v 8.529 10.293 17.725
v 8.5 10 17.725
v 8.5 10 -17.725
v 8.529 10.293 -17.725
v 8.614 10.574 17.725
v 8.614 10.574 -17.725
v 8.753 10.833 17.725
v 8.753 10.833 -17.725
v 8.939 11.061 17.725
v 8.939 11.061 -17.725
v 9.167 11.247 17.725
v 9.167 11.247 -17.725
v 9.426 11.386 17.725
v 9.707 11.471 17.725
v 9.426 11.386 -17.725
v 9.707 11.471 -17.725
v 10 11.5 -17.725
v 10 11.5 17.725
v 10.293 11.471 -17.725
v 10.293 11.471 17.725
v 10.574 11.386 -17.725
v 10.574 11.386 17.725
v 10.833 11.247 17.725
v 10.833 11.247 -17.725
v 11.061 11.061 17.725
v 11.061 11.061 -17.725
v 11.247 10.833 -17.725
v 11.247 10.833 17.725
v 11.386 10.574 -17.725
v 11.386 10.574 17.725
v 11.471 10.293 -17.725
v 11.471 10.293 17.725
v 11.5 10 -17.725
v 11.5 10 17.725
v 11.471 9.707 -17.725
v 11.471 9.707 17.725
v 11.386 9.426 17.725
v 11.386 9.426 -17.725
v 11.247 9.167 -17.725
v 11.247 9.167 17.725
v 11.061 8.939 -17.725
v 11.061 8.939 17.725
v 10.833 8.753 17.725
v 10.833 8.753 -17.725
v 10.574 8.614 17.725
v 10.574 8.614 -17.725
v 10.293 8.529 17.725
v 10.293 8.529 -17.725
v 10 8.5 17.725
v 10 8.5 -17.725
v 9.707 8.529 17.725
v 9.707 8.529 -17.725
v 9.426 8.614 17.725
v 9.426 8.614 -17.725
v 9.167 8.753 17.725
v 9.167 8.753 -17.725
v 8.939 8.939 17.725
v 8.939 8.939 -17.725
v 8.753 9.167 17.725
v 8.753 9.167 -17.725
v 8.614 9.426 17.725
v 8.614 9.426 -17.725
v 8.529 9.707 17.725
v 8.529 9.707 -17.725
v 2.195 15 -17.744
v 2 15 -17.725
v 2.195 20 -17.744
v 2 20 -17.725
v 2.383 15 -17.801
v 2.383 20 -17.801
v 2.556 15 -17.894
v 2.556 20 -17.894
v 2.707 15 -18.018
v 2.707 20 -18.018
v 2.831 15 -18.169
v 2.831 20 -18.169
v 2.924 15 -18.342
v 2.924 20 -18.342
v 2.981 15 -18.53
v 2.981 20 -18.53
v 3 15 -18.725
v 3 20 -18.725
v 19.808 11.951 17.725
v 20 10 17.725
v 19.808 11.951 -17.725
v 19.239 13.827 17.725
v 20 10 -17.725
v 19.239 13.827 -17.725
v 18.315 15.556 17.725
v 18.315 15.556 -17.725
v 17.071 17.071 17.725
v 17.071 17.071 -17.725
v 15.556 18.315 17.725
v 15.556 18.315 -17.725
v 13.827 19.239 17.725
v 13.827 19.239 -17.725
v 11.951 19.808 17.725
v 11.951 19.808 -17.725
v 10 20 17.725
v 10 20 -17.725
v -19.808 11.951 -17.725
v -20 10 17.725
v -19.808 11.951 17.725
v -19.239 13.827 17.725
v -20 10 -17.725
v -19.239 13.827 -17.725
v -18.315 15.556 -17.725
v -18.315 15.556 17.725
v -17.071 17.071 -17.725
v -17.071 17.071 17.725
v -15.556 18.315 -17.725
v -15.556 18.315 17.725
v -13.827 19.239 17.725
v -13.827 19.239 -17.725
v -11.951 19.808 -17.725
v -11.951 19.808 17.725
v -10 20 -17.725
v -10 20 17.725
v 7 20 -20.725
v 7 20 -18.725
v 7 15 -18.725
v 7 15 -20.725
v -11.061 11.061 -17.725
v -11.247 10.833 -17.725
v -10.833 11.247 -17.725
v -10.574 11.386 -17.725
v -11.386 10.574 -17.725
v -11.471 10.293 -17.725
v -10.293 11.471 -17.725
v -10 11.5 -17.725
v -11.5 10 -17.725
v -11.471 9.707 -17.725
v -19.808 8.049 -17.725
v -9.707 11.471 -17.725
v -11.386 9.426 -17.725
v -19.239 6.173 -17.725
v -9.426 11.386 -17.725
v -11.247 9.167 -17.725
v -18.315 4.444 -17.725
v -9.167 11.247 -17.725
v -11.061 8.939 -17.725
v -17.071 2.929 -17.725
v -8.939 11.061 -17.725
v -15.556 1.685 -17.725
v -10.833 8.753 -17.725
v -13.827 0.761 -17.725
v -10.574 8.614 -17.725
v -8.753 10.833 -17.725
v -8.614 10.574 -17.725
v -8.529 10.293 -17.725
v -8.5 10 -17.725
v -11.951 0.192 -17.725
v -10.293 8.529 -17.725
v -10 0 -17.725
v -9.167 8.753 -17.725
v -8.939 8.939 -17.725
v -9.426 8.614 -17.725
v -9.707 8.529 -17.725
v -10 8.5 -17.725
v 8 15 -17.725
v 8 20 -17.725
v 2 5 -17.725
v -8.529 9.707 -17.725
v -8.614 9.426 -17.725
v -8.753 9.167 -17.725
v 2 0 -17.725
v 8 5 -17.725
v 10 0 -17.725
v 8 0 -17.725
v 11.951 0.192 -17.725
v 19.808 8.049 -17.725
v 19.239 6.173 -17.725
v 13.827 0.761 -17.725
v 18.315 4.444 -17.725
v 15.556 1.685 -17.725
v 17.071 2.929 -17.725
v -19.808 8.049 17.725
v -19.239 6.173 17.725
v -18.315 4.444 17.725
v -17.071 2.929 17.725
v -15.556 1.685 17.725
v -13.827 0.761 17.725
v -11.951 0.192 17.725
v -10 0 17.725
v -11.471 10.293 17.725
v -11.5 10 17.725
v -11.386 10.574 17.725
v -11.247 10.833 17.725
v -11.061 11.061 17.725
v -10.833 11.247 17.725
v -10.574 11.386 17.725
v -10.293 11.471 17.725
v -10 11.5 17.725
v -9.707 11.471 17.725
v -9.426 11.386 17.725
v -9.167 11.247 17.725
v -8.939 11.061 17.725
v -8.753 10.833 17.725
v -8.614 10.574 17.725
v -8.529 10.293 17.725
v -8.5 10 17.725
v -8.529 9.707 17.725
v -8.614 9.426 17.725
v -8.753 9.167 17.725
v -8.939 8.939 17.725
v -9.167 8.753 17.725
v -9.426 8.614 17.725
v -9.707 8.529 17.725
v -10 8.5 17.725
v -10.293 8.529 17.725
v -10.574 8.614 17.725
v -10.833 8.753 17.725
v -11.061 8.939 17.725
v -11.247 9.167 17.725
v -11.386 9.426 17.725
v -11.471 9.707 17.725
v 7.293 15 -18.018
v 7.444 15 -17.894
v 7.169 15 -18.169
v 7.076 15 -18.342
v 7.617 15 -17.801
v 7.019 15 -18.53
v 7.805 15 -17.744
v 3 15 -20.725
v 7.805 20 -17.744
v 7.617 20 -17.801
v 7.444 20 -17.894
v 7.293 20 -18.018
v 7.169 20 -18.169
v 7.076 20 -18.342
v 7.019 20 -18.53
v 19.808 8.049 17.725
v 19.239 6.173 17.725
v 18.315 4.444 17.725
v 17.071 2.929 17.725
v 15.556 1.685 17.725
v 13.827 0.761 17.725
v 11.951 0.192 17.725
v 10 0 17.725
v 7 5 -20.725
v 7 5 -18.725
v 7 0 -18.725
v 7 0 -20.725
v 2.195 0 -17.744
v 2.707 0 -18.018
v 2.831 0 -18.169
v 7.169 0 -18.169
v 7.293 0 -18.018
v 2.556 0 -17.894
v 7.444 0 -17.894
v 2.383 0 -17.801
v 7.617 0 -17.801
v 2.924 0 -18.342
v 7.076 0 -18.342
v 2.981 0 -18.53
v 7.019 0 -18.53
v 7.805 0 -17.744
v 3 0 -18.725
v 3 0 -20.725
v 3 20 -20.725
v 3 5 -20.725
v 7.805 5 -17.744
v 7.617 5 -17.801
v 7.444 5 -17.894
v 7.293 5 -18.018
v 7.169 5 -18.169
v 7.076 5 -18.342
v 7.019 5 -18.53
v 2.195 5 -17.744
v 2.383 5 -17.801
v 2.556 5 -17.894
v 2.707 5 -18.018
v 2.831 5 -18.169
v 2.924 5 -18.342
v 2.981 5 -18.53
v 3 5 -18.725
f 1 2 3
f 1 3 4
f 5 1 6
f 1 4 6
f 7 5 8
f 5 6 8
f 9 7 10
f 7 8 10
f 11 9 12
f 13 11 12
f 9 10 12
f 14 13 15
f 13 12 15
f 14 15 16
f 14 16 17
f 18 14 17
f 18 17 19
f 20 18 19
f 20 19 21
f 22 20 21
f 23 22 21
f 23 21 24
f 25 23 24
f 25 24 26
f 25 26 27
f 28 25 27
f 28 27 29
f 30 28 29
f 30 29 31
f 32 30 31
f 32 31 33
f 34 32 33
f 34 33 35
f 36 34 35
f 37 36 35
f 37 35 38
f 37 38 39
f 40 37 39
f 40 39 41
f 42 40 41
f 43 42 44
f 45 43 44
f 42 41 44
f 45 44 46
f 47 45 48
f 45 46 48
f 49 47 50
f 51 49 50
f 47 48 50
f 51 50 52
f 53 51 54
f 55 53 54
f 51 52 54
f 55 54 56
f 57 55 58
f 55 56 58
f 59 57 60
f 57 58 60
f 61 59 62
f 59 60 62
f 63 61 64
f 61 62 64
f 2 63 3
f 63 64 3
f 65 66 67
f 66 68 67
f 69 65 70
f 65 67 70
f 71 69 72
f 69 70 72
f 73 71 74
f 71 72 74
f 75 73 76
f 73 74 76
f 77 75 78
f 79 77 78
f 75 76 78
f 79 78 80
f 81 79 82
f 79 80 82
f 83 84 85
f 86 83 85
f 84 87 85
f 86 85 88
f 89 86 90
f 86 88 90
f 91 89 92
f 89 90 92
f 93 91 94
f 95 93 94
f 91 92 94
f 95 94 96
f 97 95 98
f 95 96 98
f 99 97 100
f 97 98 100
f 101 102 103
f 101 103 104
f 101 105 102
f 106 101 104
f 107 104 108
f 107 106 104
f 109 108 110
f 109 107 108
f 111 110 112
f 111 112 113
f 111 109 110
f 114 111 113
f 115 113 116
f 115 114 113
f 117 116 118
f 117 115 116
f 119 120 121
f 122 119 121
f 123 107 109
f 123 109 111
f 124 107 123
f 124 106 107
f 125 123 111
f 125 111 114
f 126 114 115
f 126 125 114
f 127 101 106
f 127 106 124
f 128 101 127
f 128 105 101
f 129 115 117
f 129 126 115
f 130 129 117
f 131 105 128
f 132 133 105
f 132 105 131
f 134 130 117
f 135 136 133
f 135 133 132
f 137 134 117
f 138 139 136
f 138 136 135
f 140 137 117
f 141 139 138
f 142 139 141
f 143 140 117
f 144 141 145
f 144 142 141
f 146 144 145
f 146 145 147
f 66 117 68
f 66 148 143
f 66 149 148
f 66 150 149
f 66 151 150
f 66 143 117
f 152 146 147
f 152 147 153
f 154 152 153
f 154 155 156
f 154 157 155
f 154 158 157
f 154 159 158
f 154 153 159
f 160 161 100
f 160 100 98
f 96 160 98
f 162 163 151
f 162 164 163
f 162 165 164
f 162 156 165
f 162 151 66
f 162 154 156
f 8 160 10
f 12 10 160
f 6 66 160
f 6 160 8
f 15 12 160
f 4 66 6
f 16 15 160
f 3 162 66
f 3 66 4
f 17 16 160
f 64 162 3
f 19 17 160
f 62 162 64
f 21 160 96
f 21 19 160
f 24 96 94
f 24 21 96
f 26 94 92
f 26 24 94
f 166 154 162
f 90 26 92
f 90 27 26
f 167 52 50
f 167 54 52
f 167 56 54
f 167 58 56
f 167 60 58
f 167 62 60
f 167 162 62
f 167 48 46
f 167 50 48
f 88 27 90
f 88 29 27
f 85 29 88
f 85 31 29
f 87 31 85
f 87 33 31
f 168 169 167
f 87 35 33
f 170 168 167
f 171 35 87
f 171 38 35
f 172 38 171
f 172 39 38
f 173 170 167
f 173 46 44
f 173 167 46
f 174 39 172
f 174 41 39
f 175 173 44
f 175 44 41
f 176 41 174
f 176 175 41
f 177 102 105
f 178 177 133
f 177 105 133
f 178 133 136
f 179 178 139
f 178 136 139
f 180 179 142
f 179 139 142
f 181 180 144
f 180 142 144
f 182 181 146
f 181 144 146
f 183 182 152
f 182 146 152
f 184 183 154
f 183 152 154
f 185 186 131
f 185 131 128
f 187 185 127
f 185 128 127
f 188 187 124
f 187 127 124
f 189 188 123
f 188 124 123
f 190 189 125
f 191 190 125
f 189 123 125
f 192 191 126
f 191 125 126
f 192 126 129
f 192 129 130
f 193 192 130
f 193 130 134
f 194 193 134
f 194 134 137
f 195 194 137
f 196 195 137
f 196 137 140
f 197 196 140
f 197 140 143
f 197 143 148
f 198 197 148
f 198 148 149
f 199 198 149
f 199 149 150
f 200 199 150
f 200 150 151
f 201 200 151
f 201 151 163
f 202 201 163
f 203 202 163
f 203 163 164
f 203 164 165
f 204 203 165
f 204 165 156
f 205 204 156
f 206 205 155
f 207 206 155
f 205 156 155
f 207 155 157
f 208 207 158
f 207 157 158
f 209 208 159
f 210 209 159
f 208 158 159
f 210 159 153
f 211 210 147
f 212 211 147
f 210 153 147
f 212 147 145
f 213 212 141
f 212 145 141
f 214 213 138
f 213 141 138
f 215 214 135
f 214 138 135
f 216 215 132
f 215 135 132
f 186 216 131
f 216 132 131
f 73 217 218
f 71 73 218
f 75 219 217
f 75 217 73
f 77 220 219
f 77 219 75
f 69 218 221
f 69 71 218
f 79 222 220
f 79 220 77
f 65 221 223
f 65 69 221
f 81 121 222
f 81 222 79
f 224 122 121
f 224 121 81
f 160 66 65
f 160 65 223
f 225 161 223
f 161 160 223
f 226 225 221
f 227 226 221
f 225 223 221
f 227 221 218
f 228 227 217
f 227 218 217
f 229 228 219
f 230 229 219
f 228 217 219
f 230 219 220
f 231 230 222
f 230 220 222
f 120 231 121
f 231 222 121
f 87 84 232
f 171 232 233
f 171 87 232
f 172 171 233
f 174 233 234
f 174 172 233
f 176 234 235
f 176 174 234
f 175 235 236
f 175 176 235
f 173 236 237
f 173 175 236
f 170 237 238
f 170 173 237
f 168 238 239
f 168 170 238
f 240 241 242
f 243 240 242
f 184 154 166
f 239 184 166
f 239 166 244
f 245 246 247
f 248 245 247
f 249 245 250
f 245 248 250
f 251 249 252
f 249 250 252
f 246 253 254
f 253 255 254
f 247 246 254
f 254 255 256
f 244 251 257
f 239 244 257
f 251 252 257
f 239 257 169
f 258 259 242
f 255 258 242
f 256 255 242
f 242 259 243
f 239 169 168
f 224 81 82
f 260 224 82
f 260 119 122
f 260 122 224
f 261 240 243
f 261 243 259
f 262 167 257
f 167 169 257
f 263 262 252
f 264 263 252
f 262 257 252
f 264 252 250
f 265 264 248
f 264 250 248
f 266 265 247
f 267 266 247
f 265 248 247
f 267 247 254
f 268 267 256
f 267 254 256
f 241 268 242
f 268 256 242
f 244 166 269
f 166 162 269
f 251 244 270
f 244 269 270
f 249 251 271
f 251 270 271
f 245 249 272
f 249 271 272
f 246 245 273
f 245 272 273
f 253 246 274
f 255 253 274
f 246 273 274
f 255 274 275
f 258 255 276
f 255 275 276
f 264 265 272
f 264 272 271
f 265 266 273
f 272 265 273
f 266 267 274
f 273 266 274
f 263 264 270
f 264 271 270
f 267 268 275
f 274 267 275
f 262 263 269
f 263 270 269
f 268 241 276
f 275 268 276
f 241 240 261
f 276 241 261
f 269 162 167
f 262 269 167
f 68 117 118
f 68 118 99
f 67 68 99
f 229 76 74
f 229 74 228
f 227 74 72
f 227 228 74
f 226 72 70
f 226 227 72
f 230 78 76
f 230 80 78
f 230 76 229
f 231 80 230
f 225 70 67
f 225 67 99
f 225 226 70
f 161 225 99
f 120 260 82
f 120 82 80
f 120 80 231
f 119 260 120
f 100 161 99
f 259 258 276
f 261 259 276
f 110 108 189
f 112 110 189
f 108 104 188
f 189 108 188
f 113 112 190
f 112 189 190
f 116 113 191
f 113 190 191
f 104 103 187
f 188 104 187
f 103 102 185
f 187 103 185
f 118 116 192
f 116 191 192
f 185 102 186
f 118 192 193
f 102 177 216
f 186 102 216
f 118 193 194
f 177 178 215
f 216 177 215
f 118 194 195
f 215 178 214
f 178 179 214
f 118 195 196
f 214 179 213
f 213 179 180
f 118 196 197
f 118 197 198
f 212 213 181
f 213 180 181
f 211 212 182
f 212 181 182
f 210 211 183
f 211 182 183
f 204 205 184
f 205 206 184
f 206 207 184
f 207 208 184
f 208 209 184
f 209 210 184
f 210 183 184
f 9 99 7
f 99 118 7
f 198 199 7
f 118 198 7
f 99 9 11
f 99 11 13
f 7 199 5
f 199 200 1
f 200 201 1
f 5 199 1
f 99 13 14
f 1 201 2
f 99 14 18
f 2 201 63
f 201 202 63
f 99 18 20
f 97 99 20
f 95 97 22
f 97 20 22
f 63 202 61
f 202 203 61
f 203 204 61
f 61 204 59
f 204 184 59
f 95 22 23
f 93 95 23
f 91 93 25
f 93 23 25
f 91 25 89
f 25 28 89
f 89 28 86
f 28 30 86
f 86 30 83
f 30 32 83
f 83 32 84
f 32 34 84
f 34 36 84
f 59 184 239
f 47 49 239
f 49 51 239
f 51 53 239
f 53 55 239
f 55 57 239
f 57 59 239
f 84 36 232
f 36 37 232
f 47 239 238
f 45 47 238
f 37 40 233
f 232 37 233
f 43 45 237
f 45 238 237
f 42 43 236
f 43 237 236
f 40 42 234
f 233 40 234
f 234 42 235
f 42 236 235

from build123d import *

# Parameters (mm, degrees)
SKETCH_1_W          = 40
SKETCH_1_H          = 35.45
EXTRUDE_1_DEPTH     = 20
FILLET_1_R          = 10
SKETCH_2_R          = 1.5
CUT_EXTRUDE_1_DEPTH = 77
SKETCH_3_W          = 2
SKETCH_3_H          = 10
EXTRUDE_2_DEPTH     = 3
SKETCH_4_W          = 13.504293884
SKETCH_4_H          = 10
CUT_EXTRUDE_2_DEPTH = 3
FILLET_2_R          = 1


with BuildPart() as part:
    # 草图1 → 凸台-拉伸1 (new body)
    with BuildSketch(Plane(origin=(0, 0, 0), x_dir=(1, 0, 0), z_dir=(0, 1, 0))):
        Rectangle(SKETCH_1_W, SKETCH_1_H)
    extrude(amount=EXTRUDE_1_DEPTH)

    # 圆角1
    fillet_1_edges = [part.edges().sort_by_distance(p)[0] for p in [
        (-20, 0, 0),
        (-20, 20, 0),
        (20, 0, 0),
        (20, 20, 0),
    ]]
    fillet(fillet_1_edges, radius=FILLET_1_R - 0.0001)  # a hair under: the kernel refuses the full size

    # 草图2 → 切除-拉伸1 (cut)
    with BuildSketch(Plane(origin=(0, 0, -17.725), x_dir=(-1, 0, 0), z_dir=(0, 0, -1))):
        with Locations((-10, 10)):
            Circle(SKETCH_2_R)
        with Locations((10, 10)):
            Circle(SKETCH_2_R)
    extrude(amount=-CUT_EXTRUDE_1_DEPTH, mode=Mode.SUBTRACT)

    # 草图3 → 凸台-拉伸2 (add)
    with BuildSketch(Plane(origin=(0, 0, -17.725), x_dir=(-1, 0, 0), z_dir=(0, 0, -1))):
        with Locations((-6, 5)):
            Rectangle(SKETCH_3_W, SKETCH_3_H)
        with Locations((-6, 15)):
            Rectangle(SKETCH_3_W, SKETCH_3_H)
        with Locations((-4, 5)):
            Rectangle(SKETCH_3_W, SKETCH_3_H)
        with Locations((-4, 15)):
            Rectangle(SKETCH_3_W, SKETCH_3_H)
    extrude(amount=EXTRUDE_2_DEPTH)

    # 草图4 → 切除-拉伸2 (cut)
    with BuildSketch(Plane(origin=(0, 0, -20.725), x_dir=(-1, 0, 0), z_dir=(0, 0, -1))):
        with Locations((-7, 10)):
            Rectangle(SKETCH_4_W, SKETCH_4_H)
    extrude(amount=-CUT_EXTRUDE_2_DEPTH, mode=Mode.SUBTRACT)

    # 圆角2
    fillet_2_edges = [part.edges().sort_by_distance(p)[0] for p in [
        (7, 17.5, -17.725),
        (3, 17.5, -17.725),
        (7, 2.5, -17.725),
        (3, 2.5, -17.725),
    ]]
    fillet(fillet_2_edges, radius=FILLET_2_R)


solid = part.part
